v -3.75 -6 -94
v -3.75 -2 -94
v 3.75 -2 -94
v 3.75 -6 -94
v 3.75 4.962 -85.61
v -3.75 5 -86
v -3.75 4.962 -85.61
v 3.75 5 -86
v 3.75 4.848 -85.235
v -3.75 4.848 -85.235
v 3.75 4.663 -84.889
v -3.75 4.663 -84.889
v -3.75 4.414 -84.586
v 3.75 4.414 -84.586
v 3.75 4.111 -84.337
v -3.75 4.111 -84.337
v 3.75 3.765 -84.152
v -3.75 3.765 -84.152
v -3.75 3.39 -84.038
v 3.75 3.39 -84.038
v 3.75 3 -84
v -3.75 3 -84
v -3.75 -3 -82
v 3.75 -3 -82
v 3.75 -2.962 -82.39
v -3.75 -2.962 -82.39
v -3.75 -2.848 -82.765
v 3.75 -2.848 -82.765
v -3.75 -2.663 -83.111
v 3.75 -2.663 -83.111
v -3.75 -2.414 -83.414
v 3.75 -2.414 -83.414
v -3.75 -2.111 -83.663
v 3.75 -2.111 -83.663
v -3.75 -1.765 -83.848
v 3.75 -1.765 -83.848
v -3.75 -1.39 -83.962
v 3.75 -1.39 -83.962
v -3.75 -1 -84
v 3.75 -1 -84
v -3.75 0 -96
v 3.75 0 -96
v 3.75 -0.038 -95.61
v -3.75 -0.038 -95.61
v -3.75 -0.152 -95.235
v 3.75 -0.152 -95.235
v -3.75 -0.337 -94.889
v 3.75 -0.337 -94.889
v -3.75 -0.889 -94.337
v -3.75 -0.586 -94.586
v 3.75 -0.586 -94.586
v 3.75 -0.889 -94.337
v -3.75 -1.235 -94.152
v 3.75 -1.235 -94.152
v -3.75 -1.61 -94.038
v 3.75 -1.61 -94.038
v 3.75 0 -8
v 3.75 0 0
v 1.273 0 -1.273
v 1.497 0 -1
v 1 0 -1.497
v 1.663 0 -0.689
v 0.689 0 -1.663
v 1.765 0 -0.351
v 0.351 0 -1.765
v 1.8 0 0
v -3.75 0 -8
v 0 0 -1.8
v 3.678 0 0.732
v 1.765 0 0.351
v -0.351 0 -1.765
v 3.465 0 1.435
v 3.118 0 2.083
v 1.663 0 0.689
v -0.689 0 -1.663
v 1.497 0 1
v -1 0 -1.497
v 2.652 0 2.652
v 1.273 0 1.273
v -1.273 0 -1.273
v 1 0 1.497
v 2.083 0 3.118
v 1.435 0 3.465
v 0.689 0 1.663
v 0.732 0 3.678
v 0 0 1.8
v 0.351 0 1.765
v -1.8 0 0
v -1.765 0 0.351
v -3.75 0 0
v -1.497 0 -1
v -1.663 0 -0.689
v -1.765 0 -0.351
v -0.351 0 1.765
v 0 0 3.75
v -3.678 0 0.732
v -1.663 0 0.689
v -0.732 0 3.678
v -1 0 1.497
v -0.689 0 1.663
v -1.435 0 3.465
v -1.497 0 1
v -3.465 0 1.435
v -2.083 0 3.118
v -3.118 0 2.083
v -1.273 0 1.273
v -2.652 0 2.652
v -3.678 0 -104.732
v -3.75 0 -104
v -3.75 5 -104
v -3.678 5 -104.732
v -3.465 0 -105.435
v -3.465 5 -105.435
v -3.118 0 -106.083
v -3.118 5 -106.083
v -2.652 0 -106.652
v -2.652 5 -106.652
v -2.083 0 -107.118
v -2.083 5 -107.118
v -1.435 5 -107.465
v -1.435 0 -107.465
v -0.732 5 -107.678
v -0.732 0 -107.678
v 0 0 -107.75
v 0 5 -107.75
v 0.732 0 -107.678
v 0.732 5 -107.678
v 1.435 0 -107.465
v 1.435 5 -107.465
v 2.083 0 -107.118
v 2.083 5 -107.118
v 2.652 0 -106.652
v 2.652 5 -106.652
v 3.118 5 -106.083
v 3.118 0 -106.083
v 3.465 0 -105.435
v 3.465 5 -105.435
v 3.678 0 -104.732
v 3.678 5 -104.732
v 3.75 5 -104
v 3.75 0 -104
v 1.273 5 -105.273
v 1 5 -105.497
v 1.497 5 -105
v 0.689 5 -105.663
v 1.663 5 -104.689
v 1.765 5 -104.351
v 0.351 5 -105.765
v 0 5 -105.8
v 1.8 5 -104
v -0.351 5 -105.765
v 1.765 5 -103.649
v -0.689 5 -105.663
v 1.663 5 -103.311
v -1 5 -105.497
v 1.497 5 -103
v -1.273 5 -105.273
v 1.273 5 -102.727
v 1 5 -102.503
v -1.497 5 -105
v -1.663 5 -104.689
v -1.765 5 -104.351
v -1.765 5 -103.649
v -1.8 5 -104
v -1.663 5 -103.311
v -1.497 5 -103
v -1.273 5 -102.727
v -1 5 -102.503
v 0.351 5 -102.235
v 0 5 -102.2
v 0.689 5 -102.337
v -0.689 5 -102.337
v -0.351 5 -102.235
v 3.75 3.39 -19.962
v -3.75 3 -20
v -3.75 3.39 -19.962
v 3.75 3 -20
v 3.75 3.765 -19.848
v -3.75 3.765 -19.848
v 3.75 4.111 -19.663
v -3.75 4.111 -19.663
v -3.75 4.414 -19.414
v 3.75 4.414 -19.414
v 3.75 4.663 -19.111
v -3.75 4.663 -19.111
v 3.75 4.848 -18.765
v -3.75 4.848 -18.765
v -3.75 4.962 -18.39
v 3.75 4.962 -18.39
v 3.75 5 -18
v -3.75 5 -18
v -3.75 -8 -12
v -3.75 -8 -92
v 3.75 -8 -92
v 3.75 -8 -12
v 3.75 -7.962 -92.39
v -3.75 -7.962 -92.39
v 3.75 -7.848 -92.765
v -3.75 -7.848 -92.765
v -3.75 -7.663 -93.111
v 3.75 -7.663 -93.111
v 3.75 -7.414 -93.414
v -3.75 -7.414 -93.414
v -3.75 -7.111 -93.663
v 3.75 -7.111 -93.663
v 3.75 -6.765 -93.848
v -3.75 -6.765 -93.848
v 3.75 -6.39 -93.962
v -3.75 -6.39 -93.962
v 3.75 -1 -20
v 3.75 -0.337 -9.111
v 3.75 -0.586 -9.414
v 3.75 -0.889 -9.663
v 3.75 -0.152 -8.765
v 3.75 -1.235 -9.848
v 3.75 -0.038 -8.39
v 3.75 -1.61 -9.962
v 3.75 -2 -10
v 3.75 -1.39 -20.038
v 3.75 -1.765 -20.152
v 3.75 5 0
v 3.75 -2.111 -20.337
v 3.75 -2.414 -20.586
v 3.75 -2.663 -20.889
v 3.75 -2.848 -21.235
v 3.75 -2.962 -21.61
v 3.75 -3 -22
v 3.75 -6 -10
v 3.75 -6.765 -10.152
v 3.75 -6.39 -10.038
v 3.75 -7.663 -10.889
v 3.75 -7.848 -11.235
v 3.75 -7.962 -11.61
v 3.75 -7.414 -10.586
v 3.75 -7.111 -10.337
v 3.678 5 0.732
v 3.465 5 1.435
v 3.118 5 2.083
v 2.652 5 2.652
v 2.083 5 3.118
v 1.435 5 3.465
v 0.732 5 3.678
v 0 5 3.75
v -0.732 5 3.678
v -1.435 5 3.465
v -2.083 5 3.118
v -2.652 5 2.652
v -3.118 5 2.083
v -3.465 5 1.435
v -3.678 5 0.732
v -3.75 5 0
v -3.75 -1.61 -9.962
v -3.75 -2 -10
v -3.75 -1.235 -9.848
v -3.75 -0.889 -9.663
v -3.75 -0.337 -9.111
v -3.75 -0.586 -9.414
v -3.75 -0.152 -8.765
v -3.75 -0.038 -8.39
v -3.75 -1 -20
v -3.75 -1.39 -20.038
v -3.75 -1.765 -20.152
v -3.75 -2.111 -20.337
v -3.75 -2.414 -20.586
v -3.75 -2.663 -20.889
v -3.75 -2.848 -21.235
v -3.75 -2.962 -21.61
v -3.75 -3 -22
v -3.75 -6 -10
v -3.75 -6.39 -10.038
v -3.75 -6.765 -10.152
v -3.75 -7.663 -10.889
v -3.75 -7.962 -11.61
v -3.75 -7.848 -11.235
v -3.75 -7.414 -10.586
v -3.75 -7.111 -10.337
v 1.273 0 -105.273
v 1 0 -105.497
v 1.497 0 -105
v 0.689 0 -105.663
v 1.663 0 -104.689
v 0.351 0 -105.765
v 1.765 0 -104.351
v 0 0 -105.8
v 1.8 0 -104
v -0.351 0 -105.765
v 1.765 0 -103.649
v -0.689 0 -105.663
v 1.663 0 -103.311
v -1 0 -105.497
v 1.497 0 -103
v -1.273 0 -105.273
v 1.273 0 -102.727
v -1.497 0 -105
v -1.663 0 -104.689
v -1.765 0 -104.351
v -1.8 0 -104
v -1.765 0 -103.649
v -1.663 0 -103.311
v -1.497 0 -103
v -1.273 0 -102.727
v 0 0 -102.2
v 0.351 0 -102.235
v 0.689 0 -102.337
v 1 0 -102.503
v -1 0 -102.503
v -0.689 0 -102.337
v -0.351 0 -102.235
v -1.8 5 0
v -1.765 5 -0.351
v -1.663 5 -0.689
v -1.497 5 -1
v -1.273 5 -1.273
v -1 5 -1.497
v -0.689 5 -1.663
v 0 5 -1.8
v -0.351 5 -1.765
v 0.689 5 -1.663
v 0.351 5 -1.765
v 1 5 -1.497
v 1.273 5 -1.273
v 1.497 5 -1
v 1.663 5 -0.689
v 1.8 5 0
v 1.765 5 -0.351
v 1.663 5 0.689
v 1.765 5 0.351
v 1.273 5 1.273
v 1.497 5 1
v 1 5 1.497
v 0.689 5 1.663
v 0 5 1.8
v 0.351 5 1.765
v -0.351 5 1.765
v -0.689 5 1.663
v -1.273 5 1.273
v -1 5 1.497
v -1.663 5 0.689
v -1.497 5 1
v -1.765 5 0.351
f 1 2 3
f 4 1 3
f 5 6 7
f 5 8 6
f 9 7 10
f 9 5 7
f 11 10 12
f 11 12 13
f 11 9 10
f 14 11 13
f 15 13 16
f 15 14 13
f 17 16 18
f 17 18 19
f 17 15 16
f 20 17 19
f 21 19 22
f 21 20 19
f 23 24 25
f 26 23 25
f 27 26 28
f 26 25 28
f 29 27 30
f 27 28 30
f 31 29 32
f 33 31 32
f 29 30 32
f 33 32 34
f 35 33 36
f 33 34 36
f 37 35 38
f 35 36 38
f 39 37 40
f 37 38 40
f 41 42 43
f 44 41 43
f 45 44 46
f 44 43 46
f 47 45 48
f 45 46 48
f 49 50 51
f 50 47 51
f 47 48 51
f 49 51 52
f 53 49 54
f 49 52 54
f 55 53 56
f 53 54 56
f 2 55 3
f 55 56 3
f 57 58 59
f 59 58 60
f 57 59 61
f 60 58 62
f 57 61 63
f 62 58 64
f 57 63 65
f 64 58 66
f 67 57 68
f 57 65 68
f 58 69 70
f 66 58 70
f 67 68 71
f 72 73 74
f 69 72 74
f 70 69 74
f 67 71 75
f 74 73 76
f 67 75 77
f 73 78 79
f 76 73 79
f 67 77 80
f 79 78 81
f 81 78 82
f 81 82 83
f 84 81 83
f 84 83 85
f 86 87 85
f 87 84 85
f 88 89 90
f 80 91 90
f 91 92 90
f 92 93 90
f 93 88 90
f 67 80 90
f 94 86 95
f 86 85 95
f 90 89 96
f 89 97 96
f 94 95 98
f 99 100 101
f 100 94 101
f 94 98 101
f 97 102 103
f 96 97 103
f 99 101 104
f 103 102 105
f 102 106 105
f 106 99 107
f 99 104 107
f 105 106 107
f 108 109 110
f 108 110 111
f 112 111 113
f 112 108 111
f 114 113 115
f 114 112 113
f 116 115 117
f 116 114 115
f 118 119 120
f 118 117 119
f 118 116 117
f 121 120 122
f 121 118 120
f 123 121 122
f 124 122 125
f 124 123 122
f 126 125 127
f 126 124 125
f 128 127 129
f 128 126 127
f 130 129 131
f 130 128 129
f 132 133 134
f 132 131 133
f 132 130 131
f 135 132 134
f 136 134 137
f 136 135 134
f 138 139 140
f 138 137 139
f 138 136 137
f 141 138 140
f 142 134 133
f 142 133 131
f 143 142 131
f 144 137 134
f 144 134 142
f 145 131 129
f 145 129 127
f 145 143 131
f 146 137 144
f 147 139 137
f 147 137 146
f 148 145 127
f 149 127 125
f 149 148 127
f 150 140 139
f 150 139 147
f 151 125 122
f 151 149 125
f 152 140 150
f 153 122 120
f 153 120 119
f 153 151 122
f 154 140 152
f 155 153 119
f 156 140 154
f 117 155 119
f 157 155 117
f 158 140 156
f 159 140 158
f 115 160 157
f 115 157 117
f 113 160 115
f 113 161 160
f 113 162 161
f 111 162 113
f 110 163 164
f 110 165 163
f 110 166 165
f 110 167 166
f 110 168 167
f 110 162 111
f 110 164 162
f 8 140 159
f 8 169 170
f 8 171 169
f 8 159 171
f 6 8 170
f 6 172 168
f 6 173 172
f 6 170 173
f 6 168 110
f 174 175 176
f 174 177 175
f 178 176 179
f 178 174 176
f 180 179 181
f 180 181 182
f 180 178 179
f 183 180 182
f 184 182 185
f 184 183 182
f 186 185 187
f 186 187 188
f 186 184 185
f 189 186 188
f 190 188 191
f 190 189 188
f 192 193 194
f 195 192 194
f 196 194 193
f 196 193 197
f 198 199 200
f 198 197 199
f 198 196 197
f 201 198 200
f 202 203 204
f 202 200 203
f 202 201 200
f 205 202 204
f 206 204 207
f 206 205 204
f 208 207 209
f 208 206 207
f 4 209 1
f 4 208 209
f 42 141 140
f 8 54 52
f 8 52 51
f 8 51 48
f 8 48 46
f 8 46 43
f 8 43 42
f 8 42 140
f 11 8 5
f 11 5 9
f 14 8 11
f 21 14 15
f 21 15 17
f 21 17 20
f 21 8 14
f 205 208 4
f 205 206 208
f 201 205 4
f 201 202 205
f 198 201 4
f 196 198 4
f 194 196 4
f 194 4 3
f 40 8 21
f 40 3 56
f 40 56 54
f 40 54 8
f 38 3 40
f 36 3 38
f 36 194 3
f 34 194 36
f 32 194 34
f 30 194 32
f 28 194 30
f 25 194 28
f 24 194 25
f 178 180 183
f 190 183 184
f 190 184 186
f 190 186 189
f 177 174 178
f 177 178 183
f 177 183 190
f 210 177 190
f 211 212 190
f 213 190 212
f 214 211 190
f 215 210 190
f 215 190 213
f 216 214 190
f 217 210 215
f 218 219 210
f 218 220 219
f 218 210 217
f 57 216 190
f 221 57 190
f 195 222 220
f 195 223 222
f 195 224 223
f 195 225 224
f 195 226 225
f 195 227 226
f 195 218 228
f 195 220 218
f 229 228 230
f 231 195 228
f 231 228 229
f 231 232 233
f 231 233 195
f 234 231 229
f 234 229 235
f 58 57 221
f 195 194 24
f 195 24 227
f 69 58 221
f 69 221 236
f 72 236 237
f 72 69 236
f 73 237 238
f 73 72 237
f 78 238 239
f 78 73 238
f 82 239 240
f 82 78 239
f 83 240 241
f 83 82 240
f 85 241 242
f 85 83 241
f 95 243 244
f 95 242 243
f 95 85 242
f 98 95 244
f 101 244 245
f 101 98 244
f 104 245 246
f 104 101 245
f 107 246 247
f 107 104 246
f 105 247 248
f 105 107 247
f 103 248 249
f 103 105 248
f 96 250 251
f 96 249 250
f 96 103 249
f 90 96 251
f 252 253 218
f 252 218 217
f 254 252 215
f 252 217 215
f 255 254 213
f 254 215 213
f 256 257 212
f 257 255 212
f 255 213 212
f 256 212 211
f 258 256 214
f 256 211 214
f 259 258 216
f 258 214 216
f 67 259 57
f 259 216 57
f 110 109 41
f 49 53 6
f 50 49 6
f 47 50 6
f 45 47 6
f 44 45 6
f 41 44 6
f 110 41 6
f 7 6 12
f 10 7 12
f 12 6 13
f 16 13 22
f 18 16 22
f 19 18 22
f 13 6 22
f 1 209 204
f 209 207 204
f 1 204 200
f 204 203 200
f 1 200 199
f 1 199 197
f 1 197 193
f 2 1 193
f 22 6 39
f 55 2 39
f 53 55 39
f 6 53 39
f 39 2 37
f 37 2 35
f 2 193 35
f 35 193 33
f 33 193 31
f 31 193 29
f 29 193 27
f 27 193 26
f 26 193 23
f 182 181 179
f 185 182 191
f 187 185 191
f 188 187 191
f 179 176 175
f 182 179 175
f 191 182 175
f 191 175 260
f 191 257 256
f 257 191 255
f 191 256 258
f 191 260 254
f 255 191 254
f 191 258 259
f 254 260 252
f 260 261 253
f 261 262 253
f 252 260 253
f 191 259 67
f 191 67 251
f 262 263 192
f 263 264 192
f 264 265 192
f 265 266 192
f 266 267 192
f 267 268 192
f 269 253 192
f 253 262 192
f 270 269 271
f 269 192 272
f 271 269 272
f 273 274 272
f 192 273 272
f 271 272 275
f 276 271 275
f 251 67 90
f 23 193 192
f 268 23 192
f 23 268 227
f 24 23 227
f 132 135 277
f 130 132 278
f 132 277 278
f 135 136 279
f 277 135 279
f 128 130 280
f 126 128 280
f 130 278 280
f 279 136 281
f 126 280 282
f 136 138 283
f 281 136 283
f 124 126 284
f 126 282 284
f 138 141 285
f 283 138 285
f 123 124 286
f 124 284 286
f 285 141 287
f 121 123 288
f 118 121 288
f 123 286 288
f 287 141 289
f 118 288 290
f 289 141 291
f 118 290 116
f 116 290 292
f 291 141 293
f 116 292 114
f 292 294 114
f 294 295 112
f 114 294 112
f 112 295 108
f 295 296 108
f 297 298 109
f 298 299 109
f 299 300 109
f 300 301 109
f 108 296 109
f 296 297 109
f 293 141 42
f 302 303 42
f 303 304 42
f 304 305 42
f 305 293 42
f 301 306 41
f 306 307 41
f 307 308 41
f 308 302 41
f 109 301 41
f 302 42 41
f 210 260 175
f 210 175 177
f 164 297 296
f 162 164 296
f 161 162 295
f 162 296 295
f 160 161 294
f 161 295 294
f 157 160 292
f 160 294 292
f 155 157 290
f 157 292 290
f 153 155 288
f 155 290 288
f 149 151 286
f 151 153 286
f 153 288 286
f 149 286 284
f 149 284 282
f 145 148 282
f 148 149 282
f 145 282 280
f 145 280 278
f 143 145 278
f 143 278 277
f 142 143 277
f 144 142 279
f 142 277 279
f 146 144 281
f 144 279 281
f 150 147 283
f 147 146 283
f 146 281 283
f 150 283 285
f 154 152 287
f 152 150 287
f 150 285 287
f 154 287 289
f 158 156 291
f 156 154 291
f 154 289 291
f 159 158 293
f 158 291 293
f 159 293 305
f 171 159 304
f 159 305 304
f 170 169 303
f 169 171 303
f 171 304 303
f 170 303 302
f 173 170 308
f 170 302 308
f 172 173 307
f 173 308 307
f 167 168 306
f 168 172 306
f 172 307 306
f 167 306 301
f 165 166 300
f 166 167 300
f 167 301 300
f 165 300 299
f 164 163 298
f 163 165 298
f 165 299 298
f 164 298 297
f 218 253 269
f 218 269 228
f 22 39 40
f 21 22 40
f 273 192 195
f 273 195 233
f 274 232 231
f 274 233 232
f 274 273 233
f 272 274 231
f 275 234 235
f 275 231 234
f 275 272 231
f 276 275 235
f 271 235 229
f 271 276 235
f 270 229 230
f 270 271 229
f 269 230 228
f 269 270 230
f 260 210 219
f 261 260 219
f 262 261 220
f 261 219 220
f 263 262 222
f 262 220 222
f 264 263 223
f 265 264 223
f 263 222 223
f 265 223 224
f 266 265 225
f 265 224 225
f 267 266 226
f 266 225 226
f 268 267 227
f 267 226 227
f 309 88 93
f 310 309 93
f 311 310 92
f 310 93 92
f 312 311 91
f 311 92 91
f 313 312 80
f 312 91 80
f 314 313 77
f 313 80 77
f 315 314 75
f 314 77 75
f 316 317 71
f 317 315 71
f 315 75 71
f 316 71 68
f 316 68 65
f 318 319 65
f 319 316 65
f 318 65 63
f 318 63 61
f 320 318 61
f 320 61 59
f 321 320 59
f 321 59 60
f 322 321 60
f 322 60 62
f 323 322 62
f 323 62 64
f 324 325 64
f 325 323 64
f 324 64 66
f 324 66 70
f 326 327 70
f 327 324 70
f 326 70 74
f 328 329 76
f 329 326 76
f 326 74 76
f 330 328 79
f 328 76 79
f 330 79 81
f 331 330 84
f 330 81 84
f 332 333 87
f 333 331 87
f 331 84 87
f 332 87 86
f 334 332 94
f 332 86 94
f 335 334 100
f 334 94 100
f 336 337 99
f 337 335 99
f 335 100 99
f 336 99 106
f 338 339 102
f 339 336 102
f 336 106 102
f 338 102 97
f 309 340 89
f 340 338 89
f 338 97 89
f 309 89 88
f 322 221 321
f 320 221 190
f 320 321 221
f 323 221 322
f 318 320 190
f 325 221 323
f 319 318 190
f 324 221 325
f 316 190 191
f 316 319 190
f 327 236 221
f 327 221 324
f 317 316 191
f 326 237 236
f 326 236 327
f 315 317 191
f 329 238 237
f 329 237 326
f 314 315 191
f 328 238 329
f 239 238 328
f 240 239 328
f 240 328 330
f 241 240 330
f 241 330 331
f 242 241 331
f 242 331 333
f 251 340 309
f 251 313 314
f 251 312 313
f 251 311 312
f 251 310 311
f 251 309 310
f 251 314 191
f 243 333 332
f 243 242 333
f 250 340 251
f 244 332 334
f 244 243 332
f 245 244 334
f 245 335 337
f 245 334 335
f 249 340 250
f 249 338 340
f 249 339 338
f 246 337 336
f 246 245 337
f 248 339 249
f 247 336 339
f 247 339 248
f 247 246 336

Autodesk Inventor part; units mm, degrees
ref_plane "YZ Plane" through (0, 0, 0) normal (1, 0, 0) x (0, 1, 0)
ref_plane "XZ Plane" through (0, 0, 0) normal (0, 1, 0) x (-1, 0, 0)
ref_plane "XY Plane" through (0, 0, 0) normal (0, 0, 1) x (1, 0, 0)
sketch "草圖1" plane through (0, 0, 0) normal (0, 1, 0) x (-1, 0, 0)
  circle A0 centre (0, 0) radius 1.8
  line L0 (0, 0) -> (0, -104) construction
  circle A1 centre (0, -104) radius 1.8
  line L1 (0, -52) -> (-17, -52) construction
  circle A2 centre (0, -104) radius 3.75
  circle A3 centre (0, 0) radius 3.75
  line L2 (-3.75, -104) -> (-3.75, 0)
  line L3 (3.75, -104) -> (3.75, 0)
  line L4 (0, 0) -> (0, -20) construction
  line L5 (0, -104) -> (0, -84) construction
  line L6 (3.75, -84) -> (-3.75, -84)
  line L7 (3.75, -20) -> (-3.75, -20)
  line L8 (0, -20) -> (0, -30) construction
  line L9 (0, -84) -> (0, -74) construction
  line L10 (0, -20) -> (0, -10) construction
  line L11 (0, -84) -> (0, -94) construction
  line L12 (3.75, -94) -> (-3.75, -94)
  line L13 (3.75, -10) -> (-3.75, -10)
  dimension "d0" = 3.6
  dimension "d1" = 104
  dimension "d2" = 3.6
  dimension "d7" = 17
  dimension "d18" = 7.5
  dimension "d19" = 7.5
  dimension "d25" = 20
  dimension "d26" = 20
  dimension "d29" = 10
extrude "Extrusion5" add sketch "草圖1" along normal blind 5 contours A2 | A2 L2 L12 L3 | L12 L2 L6 L3 | L7 L2 L13 L3 | L13 L2 A3 L3 | A3
fillet "Fillet4" radius 2 2 edges at (0, 5, -20) (0, 5, -84)
extrude "Extrusion7" add sketch "草圖1" against normal blind 3 contours L12 L2 L6 L3 | L7 L2 L13 L3
sketch "Sketch2" plane through (0, -3, 0) normal (0, -1, 0) x (1, 0, 0)
  line L0 (3.75, -104) -> (3.75, 0) projected
  line L1 (-3.75, -104) -> (-3.75, 0) projected
  line L2 (-3.75, -20) -> (3.75, -20) projected
  line L3 (3.75, -10) -> (-3.75, -10) projected
  line L4 (3.75, -84) -> (-3.75, -84) projected
  line L5 (-3.75, -94) -> (3.75, -94) projected
  point P0 (0, 0)
extrude "Extrusion8" add sketch "Sketch2" along normal blind 5
fillet "Fillet5" radius 2 6 edges at (0, -8, -94) (0, -8, -10) (0, 0, -10) (0, -3, -20) (0, -3, -84) (0, 0, -94)
properties part number "防傾桿"
